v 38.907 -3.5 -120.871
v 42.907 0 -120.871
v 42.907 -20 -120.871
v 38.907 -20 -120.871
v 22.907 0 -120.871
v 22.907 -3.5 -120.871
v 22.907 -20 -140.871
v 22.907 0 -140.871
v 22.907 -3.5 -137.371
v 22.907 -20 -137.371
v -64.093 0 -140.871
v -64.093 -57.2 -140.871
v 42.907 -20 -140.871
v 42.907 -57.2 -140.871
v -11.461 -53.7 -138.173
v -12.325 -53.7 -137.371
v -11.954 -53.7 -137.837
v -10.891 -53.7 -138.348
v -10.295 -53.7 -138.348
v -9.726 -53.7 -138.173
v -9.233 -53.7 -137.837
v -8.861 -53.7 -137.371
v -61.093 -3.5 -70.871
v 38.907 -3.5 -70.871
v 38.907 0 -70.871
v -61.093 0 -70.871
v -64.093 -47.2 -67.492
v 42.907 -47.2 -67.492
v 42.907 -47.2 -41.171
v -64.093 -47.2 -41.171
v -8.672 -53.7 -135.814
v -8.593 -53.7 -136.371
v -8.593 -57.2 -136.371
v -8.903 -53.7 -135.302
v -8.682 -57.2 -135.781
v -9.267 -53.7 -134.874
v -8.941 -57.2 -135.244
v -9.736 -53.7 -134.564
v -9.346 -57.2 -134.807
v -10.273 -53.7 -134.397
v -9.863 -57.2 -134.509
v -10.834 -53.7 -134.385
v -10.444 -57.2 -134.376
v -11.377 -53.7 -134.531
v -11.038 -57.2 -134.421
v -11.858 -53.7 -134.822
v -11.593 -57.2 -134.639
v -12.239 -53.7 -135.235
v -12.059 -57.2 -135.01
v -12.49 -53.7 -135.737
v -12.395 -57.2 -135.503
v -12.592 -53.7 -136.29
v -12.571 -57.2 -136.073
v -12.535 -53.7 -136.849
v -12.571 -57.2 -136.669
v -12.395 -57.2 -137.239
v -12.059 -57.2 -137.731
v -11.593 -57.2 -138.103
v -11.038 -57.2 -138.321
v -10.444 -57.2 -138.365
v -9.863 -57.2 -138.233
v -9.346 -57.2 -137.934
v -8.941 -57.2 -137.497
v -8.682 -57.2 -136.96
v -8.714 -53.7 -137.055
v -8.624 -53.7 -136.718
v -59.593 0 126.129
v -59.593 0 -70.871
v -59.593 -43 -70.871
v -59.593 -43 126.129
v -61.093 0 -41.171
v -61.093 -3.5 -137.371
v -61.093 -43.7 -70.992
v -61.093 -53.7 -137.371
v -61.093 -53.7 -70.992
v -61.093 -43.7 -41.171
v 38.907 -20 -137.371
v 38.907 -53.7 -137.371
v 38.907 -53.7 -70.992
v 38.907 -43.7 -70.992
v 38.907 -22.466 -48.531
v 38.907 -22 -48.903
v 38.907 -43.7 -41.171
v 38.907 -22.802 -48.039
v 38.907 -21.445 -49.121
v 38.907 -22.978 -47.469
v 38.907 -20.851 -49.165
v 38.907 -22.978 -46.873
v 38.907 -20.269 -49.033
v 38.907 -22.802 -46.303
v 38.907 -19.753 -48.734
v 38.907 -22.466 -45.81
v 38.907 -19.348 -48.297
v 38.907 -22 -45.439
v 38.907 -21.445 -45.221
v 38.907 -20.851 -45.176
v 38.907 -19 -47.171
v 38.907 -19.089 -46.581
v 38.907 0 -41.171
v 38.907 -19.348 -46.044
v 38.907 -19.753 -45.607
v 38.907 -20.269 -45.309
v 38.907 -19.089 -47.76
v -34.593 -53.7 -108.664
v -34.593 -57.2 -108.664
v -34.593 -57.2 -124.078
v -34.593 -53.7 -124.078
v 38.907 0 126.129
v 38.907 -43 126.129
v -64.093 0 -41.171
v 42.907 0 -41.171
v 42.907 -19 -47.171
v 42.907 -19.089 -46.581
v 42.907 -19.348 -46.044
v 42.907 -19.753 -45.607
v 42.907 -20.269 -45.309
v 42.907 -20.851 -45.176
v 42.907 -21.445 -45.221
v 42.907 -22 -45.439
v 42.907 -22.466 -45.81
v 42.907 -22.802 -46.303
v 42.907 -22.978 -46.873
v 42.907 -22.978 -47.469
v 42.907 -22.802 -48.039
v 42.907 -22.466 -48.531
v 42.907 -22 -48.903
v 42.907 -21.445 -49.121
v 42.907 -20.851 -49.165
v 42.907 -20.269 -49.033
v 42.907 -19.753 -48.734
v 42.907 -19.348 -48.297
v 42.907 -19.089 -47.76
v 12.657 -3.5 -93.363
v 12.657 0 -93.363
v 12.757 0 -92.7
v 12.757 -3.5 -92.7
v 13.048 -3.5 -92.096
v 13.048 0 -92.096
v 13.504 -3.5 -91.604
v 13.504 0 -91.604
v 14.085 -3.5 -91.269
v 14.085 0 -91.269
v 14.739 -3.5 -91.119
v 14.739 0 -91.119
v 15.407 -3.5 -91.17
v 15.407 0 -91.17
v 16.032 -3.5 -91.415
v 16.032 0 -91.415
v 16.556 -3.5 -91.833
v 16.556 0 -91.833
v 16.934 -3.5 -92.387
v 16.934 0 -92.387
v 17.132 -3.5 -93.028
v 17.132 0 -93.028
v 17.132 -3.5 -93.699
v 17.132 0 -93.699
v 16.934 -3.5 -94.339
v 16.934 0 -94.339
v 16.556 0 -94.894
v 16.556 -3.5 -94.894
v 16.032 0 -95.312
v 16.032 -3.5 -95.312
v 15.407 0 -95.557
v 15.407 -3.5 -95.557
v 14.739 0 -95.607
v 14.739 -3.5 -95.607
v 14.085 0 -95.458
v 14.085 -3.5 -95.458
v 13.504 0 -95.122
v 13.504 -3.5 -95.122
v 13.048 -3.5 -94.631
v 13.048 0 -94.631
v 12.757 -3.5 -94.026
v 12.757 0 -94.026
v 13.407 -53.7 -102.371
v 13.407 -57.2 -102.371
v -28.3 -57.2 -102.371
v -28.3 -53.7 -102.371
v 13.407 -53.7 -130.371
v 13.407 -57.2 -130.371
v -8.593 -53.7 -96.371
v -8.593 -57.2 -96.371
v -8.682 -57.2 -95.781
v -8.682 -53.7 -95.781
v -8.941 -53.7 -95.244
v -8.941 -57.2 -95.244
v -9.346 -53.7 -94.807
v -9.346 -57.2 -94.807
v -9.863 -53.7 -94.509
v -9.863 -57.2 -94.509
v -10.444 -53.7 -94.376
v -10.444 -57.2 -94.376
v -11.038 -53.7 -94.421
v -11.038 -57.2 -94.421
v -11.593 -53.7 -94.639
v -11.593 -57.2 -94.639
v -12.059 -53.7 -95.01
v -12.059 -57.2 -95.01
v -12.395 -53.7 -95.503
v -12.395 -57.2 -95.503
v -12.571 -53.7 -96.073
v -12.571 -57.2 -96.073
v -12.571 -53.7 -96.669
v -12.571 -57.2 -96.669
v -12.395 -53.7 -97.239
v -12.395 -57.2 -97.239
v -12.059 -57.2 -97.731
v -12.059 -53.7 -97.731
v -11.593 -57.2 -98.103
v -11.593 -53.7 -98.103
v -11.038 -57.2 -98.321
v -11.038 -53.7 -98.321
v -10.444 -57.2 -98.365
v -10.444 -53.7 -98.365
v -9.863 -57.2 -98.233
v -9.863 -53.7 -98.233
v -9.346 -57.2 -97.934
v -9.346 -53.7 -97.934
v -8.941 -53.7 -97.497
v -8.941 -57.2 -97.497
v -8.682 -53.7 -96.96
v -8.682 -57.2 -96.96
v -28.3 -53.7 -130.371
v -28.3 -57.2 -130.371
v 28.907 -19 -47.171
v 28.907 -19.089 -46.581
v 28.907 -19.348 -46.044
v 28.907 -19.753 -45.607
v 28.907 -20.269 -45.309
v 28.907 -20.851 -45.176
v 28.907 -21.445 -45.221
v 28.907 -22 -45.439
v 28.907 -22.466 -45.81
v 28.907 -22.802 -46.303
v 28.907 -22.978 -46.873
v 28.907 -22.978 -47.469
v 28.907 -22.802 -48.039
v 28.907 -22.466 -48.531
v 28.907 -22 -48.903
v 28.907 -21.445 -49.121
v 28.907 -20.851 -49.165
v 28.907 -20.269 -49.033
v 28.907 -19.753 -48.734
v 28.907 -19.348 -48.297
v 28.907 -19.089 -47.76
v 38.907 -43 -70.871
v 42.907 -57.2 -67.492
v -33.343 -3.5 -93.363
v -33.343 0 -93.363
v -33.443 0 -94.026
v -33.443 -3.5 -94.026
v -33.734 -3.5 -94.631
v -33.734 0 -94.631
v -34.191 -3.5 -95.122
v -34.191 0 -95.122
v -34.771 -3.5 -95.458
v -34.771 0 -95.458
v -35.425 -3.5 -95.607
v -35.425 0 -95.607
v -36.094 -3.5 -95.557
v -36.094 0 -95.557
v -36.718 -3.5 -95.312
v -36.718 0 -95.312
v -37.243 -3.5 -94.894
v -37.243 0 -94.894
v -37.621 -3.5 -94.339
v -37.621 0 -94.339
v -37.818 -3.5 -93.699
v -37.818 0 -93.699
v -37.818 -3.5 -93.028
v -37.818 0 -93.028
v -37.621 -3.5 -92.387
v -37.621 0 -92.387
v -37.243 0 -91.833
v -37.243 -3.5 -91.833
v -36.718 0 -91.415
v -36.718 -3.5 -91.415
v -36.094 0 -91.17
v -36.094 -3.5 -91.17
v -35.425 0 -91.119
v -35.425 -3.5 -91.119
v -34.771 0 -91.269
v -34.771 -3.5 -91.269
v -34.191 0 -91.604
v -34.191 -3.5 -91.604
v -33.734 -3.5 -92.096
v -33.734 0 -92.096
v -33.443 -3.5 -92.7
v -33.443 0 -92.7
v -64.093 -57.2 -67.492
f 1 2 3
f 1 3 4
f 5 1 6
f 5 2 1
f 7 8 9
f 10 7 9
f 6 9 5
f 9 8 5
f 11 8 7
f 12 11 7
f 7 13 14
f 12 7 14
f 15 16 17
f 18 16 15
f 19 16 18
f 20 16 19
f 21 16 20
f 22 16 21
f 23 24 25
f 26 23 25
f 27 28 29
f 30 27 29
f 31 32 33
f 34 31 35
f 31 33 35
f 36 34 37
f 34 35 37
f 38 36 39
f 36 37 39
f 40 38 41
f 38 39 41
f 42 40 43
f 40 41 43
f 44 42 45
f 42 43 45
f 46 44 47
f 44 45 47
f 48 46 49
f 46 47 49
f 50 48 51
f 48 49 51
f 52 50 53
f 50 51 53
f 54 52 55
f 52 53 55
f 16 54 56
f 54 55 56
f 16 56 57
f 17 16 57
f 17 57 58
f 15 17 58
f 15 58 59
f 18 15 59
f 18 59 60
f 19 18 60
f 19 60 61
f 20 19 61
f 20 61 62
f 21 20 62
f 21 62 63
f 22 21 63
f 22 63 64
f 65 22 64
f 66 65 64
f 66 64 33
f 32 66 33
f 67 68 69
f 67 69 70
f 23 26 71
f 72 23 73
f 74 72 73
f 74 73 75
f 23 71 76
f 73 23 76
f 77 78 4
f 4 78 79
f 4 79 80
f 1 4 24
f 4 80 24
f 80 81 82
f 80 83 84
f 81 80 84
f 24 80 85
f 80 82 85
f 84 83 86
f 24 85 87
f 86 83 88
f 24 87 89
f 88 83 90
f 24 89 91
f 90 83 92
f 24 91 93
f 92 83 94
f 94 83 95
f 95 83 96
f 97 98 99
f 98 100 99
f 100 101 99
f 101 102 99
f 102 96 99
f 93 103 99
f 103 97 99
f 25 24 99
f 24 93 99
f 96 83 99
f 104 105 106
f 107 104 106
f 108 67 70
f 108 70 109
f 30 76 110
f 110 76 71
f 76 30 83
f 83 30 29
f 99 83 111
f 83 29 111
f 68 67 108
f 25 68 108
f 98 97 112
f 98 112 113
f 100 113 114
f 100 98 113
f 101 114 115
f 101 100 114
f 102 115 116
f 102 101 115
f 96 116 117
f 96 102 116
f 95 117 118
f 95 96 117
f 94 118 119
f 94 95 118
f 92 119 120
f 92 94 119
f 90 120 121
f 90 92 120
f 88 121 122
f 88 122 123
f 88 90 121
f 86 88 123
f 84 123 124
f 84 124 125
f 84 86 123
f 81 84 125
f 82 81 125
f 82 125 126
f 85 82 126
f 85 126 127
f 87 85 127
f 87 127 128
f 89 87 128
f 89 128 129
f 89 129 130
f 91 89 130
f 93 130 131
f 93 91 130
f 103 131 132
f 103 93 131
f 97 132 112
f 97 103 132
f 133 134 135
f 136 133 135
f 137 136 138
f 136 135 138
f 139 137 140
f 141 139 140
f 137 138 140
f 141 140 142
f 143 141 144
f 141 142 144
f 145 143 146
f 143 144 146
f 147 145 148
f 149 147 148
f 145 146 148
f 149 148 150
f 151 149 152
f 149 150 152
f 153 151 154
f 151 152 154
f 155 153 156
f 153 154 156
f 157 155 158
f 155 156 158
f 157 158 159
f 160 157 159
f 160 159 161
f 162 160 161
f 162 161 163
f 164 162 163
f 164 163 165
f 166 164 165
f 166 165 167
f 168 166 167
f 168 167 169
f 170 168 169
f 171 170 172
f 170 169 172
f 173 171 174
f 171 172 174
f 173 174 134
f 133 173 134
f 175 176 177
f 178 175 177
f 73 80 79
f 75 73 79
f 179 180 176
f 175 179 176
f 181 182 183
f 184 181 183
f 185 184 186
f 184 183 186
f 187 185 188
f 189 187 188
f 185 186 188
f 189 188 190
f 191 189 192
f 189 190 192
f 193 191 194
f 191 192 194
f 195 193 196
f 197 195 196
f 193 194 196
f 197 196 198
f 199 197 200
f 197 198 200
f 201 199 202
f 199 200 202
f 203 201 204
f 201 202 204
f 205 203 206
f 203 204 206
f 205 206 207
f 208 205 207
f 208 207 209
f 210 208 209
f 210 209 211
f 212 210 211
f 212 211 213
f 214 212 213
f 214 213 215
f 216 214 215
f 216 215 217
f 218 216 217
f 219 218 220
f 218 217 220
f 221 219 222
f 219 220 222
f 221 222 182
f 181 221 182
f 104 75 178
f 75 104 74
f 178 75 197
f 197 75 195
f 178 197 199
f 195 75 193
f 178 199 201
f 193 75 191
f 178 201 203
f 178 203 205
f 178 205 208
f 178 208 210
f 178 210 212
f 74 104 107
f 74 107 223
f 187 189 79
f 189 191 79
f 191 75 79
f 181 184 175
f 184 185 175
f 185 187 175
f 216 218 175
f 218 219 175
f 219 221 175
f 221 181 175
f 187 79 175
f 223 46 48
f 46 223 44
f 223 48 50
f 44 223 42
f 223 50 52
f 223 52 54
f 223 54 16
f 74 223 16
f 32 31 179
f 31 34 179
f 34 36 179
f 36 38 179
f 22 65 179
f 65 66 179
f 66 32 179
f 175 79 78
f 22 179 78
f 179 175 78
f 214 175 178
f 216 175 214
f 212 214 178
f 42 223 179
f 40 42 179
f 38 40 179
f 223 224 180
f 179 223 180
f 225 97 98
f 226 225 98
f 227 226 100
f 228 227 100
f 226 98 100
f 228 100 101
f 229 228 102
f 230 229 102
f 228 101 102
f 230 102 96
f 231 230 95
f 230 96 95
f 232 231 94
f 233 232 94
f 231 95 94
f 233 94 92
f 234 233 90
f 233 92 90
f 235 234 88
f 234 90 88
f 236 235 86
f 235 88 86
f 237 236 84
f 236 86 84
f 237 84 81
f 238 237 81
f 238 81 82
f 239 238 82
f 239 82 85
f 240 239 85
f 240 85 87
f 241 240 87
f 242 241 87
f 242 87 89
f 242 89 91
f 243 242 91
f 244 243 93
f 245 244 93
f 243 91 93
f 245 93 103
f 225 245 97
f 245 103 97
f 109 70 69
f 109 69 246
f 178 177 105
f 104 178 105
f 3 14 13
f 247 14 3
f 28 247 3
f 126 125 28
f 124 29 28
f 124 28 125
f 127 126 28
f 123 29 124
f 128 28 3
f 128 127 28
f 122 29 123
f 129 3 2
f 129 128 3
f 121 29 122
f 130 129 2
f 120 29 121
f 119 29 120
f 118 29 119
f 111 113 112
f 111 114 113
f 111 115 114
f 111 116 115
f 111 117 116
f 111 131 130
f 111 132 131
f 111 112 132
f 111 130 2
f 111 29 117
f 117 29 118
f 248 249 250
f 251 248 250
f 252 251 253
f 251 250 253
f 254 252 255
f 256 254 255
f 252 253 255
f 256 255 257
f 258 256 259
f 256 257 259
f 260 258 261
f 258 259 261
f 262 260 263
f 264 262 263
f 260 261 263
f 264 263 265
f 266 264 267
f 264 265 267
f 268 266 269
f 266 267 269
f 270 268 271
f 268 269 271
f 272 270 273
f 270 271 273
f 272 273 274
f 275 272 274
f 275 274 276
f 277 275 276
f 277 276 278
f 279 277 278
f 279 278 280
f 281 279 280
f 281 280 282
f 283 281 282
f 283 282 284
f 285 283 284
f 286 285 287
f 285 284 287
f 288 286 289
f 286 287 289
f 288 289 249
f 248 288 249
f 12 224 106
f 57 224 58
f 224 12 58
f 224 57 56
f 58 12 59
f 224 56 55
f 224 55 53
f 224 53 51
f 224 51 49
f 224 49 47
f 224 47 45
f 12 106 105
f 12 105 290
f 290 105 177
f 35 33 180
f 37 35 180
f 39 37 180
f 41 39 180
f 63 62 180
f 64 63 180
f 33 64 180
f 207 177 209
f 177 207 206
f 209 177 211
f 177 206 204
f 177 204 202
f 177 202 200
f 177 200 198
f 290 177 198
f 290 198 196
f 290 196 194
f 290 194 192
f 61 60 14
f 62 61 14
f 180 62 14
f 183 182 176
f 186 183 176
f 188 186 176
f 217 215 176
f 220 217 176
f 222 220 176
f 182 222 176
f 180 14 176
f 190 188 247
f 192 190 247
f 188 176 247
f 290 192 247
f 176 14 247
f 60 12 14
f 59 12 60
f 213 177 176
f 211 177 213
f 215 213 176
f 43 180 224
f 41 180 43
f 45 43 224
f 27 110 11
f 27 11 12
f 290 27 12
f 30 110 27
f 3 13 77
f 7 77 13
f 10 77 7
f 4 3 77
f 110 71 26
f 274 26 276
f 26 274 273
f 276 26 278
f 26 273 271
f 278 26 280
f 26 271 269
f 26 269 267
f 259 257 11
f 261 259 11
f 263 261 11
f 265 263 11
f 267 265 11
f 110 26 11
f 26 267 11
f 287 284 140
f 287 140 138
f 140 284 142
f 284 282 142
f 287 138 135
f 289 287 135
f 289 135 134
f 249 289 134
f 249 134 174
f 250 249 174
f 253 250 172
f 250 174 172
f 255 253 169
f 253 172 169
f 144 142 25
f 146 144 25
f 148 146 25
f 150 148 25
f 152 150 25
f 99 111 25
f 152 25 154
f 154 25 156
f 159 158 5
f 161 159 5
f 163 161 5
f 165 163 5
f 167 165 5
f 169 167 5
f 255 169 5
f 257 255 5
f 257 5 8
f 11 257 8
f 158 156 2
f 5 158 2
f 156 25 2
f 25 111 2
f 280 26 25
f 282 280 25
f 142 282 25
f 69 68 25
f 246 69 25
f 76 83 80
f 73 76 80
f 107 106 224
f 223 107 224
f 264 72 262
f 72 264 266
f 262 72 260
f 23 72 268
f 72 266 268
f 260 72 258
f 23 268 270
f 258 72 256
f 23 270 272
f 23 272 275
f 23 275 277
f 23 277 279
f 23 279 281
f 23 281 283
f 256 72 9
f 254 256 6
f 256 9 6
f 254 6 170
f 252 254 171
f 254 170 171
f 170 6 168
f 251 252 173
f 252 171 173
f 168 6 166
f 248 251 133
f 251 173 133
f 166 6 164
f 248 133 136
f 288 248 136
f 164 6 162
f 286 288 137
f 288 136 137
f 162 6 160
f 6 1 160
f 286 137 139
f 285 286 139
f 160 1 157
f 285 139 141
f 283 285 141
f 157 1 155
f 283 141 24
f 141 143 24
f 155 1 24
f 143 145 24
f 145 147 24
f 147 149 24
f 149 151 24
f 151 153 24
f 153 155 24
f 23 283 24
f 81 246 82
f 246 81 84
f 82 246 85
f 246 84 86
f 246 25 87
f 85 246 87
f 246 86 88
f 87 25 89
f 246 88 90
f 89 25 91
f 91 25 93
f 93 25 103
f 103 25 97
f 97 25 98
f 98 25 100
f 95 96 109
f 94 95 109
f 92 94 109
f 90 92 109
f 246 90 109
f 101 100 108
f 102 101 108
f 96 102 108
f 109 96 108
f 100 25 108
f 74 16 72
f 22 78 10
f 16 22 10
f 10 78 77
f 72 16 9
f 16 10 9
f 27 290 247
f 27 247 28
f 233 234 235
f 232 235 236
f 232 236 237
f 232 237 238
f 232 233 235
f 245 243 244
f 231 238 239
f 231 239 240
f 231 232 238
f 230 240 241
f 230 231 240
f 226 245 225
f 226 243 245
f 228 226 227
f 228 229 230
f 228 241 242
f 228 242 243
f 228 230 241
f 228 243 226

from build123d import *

# Parameters (mm, degrees)
F0_W      = 98.5
F0_H      = 197
F1_DEPTH  = 43
F2_R      = 2
F3_DEPTH  = 10
F4_W      = 43
F4_H      = 29.7
F4_R      = 2
F5_DEPTH  = 4
F7_DEPTH  = 100
F9_DEPTH  = 3
F10_R     = 2.25
F11_DEPTH = 3.5
F12_R     = 2
F13_DEPTH = 3.5
F14_W     = 20
F14_H     = 20
F15_DEPTH = 20


# Not quite as in the source:
# - a feature names something its author has since deleted; it is built from what else it names


with BuildPart() as f1:
    # F0 (on Front) → F1 (new body)
    with BuildSketch(Plane.XZ):
        with Locations((-10.3433534205, 27.6292130947)):
            Rectangle(F0_W, F0_H)
    extrude(amount=F1_DEPTH)

    # F2 (on face) → F3 (cut)
    with BuildSketch(Plane.YZ.offset(38.9066465795)):
        with Locations((-21, -47.1707869053)):
            Circle(F2_R)
    extrude(amount=-F3_DEPTH, mode=Mode.SUBTRACT)


with BuildPart() as f5:
    # F4 (on face) → F5 (new body)
    with BuildSketch(Plane.YZ.offset(38.9066465795)):
        Polygon((-43, -41.1707869053), (-47.2, -41.1707869053), (-47.2, -67.4921646714), (-57.2, -67.4921646714), (-57.2, -140.8707869053), (-47.2, -140.8707869053), (0, -140.8707869053), (0, -70.8707869053), (-43, -70.8707869053), align=None)
        with Locations((-21.5, -56.0207869053)):
            Rectangle(F4_W, F4_H)
        with Locations((-21, -47.1707869053)):
            Circle(F4_R, mode=Mode.SUBTRACT)
    extrude(amount=F5_DEPTH)

    # F6 (on face) → F7 (join)
    with BuildSketch(Plane(origin=(38.9066465795, 0, 0), x_dir=(0, -1, 0), z_dir=(-1, 0, 0))):
        Polygon((43.7, -41.1707869053), (43.7, -44.6707869053), (43.7, -70.9921646714), (53.7, -70.9921646714), (53.7, -137.3707869053), (3.5, -137.3707869053), (3.5, -70.8707869053), (0, -70.8707869053), (0, -140.8707869053), (57.2, -140.8707869053), (57.2, -67.4921646714), (47.2, -67.4921646714), (47.2, -41.1707869053), align=None)
    extrude(amount=F7_DEPTH)

    # F8 (on face) → F9 (join)
    with BuildSketch(Plane(origin=(-61.0933534205, 0, 0), x_dir=(0, -1, 0), z_dir=(-1, 0, 0))):
        Polygon((0, -41.1707869053), (0, -140.8707869053), (57.2, -140.8707869053), (57.2, -67.4921646714), (47.2, -67.4921646714), (47.2, -41.1707869053), (43.7, -41.1707869053), align=None)
    extrude(amount=F9_DEPTH)

    # F10 (on face) → F11 (cut, through all)
    with BuildSketch(Plane(origin=(0, 0, 0), x_dir=(-1, 0, 0), z_dir=(0, 1, 0))):
        with Locations((-14.9066465795, -93.3631800719)):
            Circle(F10_R)
        with BuildLine():
            ThreePointArc((37.8433534205, -93.3631800719), (35.5933534205, -91.1131800719), (33.3433534205, -93.3631800719))
            ThreePointArc((33.3433534205, -93.3631800719), (35.5933534205, -95.6131800719), (37.8433534205, -93.3631800719))
        make_face()
    extrude(amount=-F11_DEPTH, mode=Mode.SUBTRACT)

    # F12 (on face) → F13 (cut, through all)
    with BuildSketch(Plane.XZ.offset(57.2)):
        Polygon((-28.3004602017, -102.3707869053), (-34.5933534205, -108.6636801241), (-34.5933534205, -124.0778936865), (-28.3004602017, -130.3707869053), (13.4066465795, -130.3707869053), (13.4066465795, -102.3707869053), align=None)
        Polygon((-34.0933534205, -108.8707869053), (-28.0933534205, -102.8707869053), (12.9066465795, -102.8707869053), (12.9066465795, -129.8707869053), (-28.0933534205, -129.8707869053), (-34.0933534205, -123.8707869053), align=None, mode=Mode.SUBTRACT)
        Polygon((12.9066465795, -102.8707869053), (-28.0933534205, -102.8707869053), (-34.0933534205, -108.8707869053), (-34.0933534205, -123.8707869053), (-28.0933534205, -129.8707869053), (12.9066465795, -129.8707869053), align=None)
        with Locations((-10.5933534205, -136.3707869053)):
            Circle(F12_R)
        with Locations((-10.5933534205, -96.3707869053)):
            Circle(F12_R)
    extrude(amount=-F13_DEPTH, mode=Mode.SUBTRACT)

    # F14 (on face) → F15 (cut)
    with BuildSketch(Plane(origin=(0, 0, 0), x_dir=(-1, 0, 0), z_dir=(0, 1, 0))):
        with Locations((-32.9066465795, -130.8707869053)):
            Rectangle(F14_W, F14_H)
    extrude(amount=-F15_DEPTH, mode=Mode.SUBTRACT)


solid = Compound([f1.part, f5.part])
